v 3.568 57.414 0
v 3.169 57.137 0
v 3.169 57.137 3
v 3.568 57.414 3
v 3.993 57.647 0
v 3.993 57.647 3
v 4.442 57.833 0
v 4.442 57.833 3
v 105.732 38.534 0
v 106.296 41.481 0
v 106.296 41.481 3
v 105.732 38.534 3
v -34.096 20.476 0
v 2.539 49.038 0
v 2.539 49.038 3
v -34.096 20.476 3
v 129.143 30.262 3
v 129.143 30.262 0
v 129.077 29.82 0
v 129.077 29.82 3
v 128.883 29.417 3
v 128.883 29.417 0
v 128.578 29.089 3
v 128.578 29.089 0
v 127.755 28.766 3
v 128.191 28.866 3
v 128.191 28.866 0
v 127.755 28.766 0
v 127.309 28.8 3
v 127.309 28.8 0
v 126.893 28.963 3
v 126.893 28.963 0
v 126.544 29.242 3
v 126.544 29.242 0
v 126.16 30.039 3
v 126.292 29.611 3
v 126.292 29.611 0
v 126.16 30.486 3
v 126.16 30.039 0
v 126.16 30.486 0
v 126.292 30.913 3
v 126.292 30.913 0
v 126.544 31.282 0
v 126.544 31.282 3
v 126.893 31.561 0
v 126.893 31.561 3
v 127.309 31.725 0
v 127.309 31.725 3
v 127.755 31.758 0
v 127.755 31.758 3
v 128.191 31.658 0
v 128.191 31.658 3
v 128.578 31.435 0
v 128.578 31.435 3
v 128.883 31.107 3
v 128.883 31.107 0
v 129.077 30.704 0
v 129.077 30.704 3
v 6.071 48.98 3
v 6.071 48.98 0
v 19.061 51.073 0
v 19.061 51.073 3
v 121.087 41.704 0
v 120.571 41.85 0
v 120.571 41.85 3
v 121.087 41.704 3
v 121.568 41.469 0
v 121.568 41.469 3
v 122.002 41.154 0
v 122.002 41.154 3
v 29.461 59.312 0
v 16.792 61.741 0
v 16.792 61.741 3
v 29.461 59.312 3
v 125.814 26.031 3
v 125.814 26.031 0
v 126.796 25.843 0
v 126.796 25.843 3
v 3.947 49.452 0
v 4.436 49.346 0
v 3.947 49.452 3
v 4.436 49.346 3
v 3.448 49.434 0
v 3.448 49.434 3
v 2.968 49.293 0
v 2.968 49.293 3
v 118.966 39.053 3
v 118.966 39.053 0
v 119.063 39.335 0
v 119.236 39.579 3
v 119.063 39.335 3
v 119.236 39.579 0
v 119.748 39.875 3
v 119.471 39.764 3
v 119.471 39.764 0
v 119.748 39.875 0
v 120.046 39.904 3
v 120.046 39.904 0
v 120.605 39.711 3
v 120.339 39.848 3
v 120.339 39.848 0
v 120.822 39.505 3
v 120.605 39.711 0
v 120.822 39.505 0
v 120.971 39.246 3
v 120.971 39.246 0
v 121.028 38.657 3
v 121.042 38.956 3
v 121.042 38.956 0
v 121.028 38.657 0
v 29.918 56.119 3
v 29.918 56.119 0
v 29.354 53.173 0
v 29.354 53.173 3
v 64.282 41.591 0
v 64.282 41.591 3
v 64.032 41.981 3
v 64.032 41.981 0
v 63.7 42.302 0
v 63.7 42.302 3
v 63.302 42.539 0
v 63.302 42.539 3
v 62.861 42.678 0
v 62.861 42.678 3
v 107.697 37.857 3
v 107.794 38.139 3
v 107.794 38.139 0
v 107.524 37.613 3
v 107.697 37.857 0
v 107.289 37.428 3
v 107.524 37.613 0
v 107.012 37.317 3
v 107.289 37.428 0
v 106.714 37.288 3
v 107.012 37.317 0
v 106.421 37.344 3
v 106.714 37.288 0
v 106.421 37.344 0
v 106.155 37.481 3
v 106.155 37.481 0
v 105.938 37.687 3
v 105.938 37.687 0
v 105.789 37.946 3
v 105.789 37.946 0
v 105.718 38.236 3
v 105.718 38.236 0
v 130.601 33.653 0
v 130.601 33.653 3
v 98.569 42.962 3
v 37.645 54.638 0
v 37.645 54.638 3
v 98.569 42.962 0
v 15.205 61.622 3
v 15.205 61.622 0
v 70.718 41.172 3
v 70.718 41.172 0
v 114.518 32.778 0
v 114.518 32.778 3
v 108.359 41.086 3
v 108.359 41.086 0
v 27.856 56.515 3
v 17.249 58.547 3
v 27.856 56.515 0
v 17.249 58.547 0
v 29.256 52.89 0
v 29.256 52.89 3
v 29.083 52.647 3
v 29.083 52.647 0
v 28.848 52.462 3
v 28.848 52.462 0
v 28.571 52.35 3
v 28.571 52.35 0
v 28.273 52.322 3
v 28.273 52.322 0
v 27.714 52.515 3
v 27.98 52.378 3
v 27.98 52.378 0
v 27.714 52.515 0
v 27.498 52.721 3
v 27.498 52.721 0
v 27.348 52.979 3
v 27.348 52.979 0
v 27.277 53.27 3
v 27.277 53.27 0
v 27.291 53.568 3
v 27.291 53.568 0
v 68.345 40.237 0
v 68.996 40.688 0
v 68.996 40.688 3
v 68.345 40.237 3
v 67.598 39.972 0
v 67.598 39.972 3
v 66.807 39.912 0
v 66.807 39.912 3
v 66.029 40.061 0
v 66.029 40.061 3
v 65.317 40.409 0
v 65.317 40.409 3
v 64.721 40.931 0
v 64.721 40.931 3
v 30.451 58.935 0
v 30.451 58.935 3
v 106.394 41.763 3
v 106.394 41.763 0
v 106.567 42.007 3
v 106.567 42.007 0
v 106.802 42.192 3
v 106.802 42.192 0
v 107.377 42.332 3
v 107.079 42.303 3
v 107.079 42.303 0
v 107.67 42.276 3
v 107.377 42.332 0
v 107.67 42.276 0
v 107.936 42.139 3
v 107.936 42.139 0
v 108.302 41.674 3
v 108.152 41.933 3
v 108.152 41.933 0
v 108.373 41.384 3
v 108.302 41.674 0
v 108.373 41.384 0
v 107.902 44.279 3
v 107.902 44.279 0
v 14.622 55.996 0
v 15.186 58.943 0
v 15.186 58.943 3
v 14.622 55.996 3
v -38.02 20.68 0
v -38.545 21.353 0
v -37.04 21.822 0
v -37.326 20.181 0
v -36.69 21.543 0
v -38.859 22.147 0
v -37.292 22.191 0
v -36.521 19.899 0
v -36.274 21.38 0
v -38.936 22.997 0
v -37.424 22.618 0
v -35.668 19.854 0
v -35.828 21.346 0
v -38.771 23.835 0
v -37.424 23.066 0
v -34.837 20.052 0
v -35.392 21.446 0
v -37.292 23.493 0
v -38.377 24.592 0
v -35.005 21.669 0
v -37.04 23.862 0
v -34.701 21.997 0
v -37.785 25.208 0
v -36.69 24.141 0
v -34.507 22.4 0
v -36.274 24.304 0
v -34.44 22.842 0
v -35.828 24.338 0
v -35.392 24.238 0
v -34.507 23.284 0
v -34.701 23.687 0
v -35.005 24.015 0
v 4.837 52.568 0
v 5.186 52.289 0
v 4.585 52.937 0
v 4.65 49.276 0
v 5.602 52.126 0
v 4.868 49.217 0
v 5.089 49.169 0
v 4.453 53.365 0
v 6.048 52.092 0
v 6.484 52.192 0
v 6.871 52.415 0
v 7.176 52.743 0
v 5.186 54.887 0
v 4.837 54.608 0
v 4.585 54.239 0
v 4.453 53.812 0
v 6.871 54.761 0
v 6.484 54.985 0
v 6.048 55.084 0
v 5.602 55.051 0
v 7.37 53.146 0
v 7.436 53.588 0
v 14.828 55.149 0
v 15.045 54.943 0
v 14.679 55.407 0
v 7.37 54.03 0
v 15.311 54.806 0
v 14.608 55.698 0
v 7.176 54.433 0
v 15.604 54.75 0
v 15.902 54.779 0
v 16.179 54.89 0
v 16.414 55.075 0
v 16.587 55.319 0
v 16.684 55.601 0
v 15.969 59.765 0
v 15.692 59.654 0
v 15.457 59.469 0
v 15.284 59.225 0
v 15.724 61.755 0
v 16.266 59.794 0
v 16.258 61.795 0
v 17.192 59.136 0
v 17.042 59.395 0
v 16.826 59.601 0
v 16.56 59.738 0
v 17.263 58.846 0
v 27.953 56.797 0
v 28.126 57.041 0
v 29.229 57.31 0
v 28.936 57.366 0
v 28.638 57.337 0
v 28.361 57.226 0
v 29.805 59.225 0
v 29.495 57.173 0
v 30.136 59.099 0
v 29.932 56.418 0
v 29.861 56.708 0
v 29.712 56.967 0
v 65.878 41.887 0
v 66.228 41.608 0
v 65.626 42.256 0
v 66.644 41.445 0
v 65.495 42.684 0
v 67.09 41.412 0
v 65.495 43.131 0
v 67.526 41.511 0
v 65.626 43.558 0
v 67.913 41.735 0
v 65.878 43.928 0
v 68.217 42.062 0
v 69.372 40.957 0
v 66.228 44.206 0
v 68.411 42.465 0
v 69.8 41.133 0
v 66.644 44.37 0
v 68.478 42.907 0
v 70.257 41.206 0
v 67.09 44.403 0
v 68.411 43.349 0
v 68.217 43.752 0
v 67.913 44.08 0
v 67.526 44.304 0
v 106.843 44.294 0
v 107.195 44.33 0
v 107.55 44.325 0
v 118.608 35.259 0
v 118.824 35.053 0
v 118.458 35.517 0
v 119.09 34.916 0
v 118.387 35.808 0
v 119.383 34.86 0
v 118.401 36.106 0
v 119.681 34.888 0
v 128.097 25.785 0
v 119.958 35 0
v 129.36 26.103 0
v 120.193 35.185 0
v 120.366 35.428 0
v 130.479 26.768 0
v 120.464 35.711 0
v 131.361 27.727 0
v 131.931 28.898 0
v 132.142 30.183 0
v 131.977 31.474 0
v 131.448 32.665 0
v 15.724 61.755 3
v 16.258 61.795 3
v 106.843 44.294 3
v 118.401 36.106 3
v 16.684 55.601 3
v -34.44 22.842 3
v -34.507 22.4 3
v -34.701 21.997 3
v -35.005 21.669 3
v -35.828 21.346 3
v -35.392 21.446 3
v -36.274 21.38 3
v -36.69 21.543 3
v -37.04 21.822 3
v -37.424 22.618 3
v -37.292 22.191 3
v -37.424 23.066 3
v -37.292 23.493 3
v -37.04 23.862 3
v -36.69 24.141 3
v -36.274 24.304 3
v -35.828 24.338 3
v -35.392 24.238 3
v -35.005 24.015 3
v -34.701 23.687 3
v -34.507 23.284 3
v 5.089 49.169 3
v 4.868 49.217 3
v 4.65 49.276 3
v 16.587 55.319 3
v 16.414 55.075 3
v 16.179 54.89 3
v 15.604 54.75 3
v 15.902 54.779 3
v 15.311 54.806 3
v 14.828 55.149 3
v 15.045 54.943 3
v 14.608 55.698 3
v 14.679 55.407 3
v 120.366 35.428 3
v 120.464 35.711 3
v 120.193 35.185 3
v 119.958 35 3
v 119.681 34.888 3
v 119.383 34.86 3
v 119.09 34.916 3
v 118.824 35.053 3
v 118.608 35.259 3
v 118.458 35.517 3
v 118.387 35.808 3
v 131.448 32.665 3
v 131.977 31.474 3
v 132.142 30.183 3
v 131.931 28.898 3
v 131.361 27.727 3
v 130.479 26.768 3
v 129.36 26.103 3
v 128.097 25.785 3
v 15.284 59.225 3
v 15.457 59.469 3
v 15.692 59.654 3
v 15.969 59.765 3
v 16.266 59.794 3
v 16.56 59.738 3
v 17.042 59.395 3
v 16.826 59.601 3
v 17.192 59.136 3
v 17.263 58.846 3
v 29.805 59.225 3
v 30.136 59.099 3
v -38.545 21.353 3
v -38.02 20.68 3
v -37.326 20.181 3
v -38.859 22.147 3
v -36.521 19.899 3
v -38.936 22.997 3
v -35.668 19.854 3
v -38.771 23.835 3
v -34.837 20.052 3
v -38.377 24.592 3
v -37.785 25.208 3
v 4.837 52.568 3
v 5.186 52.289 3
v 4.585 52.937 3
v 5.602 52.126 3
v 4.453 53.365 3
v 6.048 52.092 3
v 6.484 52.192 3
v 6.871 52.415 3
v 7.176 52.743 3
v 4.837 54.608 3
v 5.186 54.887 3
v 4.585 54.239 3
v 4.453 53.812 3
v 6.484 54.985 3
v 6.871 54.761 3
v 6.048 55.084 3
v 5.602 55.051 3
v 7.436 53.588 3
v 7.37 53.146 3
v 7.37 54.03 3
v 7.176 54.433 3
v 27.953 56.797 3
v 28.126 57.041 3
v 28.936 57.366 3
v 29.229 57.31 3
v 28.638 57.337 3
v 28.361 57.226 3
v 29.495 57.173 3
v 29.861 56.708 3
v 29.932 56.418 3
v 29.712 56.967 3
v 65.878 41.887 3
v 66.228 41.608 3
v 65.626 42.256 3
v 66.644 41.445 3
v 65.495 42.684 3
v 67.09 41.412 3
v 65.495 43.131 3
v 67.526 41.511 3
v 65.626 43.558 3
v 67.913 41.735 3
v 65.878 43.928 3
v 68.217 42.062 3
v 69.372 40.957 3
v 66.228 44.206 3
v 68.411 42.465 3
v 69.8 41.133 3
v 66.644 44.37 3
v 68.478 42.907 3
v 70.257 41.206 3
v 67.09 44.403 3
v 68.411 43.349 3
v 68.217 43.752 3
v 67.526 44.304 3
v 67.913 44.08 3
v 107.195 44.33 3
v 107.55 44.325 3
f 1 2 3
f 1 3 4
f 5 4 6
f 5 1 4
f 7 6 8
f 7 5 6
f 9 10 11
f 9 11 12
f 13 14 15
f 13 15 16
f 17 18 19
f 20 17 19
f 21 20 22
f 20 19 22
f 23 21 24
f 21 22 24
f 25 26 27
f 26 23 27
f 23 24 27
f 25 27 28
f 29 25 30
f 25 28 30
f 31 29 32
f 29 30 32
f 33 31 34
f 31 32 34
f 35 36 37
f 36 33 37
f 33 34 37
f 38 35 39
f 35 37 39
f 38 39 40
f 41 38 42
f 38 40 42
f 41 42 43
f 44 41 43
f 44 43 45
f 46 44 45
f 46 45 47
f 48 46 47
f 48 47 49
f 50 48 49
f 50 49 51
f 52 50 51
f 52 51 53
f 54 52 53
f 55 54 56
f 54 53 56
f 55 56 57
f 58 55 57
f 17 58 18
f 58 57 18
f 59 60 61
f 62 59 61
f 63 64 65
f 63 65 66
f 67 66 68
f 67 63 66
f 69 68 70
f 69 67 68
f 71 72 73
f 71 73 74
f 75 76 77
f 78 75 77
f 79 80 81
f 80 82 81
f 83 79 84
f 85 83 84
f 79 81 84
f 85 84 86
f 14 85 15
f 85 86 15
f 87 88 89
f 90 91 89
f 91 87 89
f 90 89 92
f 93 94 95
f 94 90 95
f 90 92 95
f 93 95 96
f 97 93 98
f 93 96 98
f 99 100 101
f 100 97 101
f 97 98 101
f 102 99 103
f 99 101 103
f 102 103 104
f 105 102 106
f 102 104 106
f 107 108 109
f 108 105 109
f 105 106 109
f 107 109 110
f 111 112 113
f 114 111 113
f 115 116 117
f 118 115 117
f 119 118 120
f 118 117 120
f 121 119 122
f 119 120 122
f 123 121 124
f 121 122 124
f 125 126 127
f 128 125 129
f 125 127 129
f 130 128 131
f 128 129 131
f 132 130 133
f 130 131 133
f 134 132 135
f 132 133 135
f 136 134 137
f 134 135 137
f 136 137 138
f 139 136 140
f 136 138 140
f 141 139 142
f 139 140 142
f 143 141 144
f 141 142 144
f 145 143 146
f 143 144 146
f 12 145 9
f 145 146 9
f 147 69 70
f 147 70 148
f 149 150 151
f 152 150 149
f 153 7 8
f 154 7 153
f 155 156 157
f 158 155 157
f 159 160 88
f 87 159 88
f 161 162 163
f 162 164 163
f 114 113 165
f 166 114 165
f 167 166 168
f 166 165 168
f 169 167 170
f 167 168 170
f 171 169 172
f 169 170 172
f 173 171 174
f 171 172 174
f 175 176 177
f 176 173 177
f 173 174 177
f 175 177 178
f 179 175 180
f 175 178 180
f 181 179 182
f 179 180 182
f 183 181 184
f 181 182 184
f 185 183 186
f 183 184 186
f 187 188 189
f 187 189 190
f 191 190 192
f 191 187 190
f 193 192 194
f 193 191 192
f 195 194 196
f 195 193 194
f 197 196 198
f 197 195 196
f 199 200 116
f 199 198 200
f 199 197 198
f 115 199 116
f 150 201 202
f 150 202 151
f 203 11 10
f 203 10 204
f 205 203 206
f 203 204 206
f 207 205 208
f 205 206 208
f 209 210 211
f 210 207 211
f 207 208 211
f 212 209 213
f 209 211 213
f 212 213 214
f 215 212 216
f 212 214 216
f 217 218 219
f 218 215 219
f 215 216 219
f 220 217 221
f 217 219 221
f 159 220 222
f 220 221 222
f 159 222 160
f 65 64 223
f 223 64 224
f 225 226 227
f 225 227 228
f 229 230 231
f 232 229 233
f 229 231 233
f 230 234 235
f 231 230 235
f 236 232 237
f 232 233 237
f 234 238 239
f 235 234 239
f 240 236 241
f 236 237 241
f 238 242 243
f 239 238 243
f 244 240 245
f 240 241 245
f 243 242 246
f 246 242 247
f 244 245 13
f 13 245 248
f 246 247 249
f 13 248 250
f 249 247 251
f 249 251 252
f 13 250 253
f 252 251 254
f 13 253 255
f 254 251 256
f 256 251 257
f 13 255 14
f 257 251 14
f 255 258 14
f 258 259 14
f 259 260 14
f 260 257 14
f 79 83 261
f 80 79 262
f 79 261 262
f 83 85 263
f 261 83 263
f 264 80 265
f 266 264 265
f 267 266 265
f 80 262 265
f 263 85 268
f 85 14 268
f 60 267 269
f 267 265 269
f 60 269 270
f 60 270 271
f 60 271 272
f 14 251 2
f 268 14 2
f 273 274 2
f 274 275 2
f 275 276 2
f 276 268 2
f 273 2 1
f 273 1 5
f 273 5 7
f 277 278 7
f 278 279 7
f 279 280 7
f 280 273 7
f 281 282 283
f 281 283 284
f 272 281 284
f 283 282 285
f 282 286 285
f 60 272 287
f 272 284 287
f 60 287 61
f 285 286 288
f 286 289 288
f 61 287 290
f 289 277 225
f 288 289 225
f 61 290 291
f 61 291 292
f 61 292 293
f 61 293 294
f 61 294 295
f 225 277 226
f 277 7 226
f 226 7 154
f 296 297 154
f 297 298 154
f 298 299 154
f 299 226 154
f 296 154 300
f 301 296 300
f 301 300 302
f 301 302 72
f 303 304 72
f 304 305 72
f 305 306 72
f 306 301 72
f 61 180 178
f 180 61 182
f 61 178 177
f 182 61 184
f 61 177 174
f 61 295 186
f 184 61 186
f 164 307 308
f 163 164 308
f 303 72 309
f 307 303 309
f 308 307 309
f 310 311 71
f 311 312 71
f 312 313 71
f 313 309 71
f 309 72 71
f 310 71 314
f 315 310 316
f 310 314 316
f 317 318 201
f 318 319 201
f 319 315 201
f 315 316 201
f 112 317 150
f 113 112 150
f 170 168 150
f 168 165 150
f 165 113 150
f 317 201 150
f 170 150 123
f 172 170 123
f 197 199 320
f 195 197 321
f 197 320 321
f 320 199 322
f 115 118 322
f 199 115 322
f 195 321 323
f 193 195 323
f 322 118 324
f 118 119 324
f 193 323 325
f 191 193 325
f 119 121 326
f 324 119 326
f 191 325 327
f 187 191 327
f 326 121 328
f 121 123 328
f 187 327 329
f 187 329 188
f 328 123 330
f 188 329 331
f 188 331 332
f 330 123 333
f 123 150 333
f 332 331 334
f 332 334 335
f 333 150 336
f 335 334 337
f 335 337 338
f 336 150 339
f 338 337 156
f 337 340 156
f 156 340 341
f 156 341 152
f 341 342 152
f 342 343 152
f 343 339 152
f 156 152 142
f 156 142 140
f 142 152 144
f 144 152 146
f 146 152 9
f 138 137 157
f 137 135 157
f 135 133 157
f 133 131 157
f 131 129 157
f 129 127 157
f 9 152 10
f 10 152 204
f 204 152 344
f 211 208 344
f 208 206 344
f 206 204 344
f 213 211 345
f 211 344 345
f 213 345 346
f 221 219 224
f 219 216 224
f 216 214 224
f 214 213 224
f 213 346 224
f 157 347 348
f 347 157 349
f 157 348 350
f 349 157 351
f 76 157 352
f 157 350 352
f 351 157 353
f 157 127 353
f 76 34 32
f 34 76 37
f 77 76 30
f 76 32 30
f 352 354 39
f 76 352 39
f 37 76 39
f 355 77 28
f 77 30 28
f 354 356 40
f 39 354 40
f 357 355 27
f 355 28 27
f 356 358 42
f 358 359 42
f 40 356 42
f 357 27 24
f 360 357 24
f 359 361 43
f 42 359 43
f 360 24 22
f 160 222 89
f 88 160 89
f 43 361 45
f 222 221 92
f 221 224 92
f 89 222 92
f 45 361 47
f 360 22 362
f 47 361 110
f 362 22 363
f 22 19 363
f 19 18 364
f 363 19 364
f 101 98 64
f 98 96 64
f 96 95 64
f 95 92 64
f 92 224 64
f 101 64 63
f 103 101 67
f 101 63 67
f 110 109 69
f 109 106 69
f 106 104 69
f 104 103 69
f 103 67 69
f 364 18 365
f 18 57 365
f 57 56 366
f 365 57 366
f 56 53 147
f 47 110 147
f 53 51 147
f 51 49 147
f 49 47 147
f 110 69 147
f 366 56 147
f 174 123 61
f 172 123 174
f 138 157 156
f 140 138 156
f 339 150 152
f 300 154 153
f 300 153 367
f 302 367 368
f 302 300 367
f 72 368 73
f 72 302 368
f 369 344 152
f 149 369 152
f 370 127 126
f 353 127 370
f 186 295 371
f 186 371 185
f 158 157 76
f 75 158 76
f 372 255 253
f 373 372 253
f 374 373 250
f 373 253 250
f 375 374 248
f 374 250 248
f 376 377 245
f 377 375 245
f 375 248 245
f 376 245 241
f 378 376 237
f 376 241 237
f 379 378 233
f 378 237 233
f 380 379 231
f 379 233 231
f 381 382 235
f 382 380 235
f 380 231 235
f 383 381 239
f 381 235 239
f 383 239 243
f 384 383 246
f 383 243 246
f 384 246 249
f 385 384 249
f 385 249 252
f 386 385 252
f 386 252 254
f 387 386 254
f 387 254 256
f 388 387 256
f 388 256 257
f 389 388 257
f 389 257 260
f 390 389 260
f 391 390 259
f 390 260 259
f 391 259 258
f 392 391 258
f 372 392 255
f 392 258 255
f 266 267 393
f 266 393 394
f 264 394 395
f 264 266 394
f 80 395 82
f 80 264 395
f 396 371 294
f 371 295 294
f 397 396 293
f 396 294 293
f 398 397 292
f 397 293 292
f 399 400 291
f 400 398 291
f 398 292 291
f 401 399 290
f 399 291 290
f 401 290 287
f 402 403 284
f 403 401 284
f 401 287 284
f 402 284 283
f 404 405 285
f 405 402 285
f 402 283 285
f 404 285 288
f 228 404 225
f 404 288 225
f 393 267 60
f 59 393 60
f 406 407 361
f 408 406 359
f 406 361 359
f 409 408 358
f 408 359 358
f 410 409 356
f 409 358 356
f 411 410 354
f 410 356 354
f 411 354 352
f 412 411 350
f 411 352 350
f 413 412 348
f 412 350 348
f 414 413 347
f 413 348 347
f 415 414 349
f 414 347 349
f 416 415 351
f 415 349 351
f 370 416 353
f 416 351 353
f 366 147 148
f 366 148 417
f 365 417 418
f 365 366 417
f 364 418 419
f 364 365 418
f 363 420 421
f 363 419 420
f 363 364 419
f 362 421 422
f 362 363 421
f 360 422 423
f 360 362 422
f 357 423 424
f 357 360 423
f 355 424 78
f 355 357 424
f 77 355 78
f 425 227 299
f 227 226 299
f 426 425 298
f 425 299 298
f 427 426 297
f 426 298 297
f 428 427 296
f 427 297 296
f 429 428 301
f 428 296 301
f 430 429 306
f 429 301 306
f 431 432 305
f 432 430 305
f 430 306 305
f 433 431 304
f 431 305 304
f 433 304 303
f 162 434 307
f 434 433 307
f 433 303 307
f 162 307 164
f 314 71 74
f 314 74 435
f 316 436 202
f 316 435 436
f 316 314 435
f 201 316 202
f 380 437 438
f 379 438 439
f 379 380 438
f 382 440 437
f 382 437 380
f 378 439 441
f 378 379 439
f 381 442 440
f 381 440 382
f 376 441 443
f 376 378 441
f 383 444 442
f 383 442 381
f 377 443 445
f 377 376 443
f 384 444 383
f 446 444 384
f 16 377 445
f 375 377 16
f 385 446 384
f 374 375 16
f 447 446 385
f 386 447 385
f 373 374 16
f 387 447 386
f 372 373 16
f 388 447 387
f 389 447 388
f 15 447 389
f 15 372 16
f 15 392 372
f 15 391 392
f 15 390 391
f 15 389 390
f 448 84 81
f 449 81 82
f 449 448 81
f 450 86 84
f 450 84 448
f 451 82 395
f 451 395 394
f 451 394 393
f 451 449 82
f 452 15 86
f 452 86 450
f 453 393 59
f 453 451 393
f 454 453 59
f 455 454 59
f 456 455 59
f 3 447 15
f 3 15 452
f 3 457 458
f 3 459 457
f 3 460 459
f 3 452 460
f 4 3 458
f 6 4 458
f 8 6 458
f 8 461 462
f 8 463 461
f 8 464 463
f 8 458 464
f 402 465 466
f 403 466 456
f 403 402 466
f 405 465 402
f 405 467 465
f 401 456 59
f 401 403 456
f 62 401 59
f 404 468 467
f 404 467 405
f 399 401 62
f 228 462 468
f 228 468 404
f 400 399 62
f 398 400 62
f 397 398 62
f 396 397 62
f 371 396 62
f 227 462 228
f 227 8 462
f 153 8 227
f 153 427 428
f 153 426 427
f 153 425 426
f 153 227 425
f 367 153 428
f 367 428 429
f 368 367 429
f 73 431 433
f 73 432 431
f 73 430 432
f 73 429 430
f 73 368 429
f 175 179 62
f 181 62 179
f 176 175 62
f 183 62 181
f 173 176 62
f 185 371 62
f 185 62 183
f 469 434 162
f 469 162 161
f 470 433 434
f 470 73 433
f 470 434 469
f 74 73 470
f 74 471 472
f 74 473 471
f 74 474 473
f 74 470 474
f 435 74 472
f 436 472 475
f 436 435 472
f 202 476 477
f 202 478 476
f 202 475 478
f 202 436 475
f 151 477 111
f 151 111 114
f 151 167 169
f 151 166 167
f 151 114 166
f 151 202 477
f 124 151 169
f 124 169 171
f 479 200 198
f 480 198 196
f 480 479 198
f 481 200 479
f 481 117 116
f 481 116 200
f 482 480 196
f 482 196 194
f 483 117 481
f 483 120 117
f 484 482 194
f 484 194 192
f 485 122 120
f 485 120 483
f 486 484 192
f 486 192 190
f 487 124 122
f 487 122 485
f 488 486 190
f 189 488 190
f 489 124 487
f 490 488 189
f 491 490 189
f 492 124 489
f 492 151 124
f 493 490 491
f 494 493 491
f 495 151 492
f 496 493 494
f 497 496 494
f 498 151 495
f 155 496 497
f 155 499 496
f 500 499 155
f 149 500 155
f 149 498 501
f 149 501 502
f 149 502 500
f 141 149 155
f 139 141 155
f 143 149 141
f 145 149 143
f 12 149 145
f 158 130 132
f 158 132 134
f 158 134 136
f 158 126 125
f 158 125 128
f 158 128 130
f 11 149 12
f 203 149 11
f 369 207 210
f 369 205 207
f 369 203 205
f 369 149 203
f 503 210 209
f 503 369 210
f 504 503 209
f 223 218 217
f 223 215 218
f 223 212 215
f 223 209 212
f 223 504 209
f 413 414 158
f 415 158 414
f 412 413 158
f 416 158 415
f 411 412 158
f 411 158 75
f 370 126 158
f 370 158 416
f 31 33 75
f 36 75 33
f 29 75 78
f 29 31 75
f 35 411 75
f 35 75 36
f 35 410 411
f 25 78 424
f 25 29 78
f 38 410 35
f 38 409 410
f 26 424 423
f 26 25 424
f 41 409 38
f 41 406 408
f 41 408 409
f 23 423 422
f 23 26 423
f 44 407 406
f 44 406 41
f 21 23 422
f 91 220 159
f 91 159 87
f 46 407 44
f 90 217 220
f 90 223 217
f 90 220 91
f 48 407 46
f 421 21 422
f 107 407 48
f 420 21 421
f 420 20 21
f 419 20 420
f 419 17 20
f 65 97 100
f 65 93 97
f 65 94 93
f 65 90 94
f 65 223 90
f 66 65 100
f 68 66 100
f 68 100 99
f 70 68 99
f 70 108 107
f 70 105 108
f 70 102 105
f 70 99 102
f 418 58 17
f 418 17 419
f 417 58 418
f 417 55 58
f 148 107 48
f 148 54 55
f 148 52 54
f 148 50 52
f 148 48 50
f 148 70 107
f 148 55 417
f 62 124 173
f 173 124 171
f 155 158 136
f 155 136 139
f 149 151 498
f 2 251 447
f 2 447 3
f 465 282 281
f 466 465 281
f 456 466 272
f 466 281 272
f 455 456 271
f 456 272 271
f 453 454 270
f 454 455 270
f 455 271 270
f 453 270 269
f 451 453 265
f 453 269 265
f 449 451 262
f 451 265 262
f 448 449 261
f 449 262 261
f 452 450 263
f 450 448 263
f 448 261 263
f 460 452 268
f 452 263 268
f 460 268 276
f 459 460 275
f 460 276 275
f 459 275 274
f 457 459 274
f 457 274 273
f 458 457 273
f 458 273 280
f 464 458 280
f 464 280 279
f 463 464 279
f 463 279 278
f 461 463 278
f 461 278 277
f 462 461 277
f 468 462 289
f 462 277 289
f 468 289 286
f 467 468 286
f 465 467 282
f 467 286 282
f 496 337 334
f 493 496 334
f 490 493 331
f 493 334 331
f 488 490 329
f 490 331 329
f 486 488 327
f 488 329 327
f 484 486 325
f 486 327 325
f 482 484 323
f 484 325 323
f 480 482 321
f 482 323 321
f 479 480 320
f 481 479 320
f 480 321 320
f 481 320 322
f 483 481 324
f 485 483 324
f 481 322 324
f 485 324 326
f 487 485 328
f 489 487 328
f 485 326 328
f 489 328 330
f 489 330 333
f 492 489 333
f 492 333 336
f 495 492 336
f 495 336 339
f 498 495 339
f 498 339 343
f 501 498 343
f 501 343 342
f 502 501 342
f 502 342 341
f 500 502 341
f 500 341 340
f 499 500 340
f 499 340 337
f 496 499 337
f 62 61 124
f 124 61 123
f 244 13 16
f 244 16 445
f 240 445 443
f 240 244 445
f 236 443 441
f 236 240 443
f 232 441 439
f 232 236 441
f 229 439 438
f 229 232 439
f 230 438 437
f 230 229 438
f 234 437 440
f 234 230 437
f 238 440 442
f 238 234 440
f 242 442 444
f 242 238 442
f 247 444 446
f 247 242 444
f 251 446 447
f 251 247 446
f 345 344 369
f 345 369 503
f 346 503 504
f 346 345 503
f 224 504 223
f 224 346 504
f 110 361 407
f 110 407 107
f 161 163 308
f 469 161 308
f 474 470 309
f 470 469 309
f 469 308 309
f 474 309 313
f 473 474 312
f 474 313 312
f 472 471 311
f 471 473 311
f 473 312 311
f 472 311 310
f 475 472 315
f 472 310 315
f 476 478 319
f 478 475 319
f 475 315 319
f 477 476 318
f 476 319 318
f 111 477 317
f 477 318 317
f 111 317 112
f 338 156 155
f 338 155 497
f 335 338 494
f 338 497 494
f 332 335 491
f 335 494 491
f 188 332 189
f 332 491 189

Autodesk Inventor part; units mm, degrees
ref_plane "YZ Plane" through (0, 0, 0) normal (1, 0, 0) x (0, 1, 0)
ref_plane "XZ Plane" through (0, 0, 0) normal (0, 1, 0) x (-1, 0, 0)
ref_plane "XY Plane" through (0, 0, 0) normal (0, 0, 1) x (1, 0, 0)
sketch "スケッチ1" plane through (0, 0, 0) normal (0, 0, 1) x (1, 0, 0)
  circle A0 centre (127.64315, 30.26217) radius 1.5
  circle A1 centre (5.936242, 53.5882) radius 1.5
  line L0 (5.936242, 53.5882) -> (127.64315, 30.26217) construction
  circle A2 centre (5.936242, 53.5882) radius 4.025
  circle A3 centre (127.64315, 30.26217) radius 4.025
  arc A4 (127.25169, 23.248085) -> (128.965476, 37.161596) centre (127.64315, 30.26217) ccw
  line L1 (12.835668, 52.265874) -> (13.400362, 55.212248)
  line L2 (15.462824, 54.816962) -> (26.069771, 52.784062)
  line L3 (28.132233, 52.388776) -> (27.567538, 49.442402)
  line L4 (14.89813, 51.870588) -> (25.505076, 49.837688)
  line L5 (120.743724, 31.584496) -> (121.308418, 34.53087)
  line L6 (119.245956, 34.926156) -> (108.63901, 36.959056)
  line L7 (106.576548, 37.354342) -> (106.011853, 34.407968)
  line L8 (108.074315, 34.012682) -> (118.681262, 31.979782)
  circle A5 centre (19.354562, 46.434577) radius 3
  circle A6 centre (112.530747, 28.576671) radius 3
  line L9 (7.258568, 60.487626) -> (128.965476, 37.161596)
  arc A7 (17.926333, 42.16724) -> (21.546529, 42.504529) centre (19.354562, 46.434577) ccw
  arc A8 (109.041036, 25.735559) -> (112.27999, 24.083663) centre (112.530747, 28.576671) ccw
  line L10 (3.706619, 46.926413) -> (17.926333, 42.16724)
  line L11 (112.27999, 24.083663) -> (127.25169, 23.248085)
  circle A9 centre (19.354562, 46.434577) radius 1.5
  circle A10 centre (112.530747, 28.576671) radius 1.5
  line L12 (32.344248, 48.52691) -> (21.546529, 42.504529)
  line L13 (109.041036, 25.735559) -> (101.235144, 35.32346)
  line L14 (32.344248, 48.52691) -> (101.235144, 35.32346)
  arc A11 (108.63901, 36.959056) -> (106.576548, 37.354342) centre (107.607779, 37.156699) ccw
  arc A12 (106.011853, 34.407968) -> (108.074315, 34.012682) centre (107.043084, 34.210325) ccw
  arc A13 (121.308418, 34.53087) -> (119.245956, 34.926156) centre (120.277187, 34.728513) ccw
  arc A14 (118.681262, 31.979782) -> (120.743724, 31.584496) centre (119.712493, 31.782139) ccw
  arc A15 (28.132233, 52.388776) -> (26.069771, 52.784062) centre (27.101002, 52.586419) ccw
  arc A16 (25.505076, 49.837688) -> (27.567538, 49.442402) centre (26.536307, 49.640045) ccw
  arc A17 (15.462824, 54.816962) -> (13.400362, 55.212248) centre (14.431593, 55.014605) ccw
  arc A18 (12.835668, 52.265874) -> (14.89813, 51.870588) centre (13.866899, 52.068231) ccw
  line L15 (5.936242, 53.5882) -> (-35.940425, 22.842004) construction
  circle A19 centre (-35.940425, 22.842004) radius 1.5
  arc A20 (-37.715892, 25.26021) -> (-34.164958, 20.423799) centre (-35.940425, 22.842004) ccw
  line L16 (-37.715892, 25.26021) -> (-0.959545, 52.247024)
  line L17 (-34.164958, 20.423799) -> (2.591389, 47.410613)
  arc A21 (7.258568, 60.487626) -> (-0.959545, 52.247024) centre (5.936242, 53.5882) ccw
  arc A22 (2.591389, 47.410613) -> (3.706619, 46.926413) centre (5.936242, 53.5882) ccw
  point P0 (0, 0)
  point P1 (0, 0)
  dimension "d0" = 8.05
  dimension "d1" = 8.05
  dimension "d2" = 3
  dimension "d3" = 3
  dimension "d4" = 15
  dimension "d5" = 3
  dimension "d6" = 15
  dimension "d7" = 6
  dimension "d8" = 6
  dimension "d9" = 9
  dimension "d10" = 9
  dimension "d11" = 3
  dimension "d12" = 3
  dimension "d13" = 7.5
  dimension "d14" = 7.5
  dimension "d15" = 40
  dimension "d16" = 40
  dimension "d17" = 2.1
  dimension "d18" = 2.1
  dimension "d19" = 2.1
  dimension "d20" = 2.1
  dimension "d21" = 2.1
  dimension "d22" = 2.1
  dimension "d23" = 2.1
  dimension "d24" = 2.1
  dimension "d25" = 3
  dimension "d26" = 6
  dimension "d27" = 3
  dimension "d28" = 3
sketch "スケッチ3" plane through (0, 0, 0) normal (0, 0, 1) x (1, 0, 0)
  circle A0 centre (0, 0) radius 10.1 construction
  circle A1 centre (25.320198, -9.936175) radius 17.1 construction
  circle A2 centre (110.474331, -16.4118) radius 28.1 construction
  circle A3 centre (62.413099, -12.756939) radius 20.1 construction
  circle A4 centre (-21.690847, -16.4118) radius 17.1 construction
  circle A5 centre (-105.525669, -16.4118) radius 28.1 construction
  line L0 (-170.91498, -81.4118) -> (490.004419, -81.4118)
  line L1 (-105.525669, -16.4118) -> (-21.690847, -16.4118) construction
  line L2 (110.474331, -16.4118) -> (25.320198, -9.936175) construction
  line L3 (110.474331, -16.4118) -> (104.150058, -0.631953)
  line L4 (104.150058, -0.631953) -> (95.593688, 20.717252) construction
  line L5 (95.593688, 20.717252) -> (70.474331, -10.4118) construction
  line L6 (70.474331, -10.4118) -> (110.474331, -16.4118) construction
  line L7 (-137.681852, 53.5882) -> (165.818568, 53.5882)
  line L8 (25.320198, -9.936175) -> (108.686903, 8.5882) construction
  line L9 (25.320198, -9.936175) -> (102.538646, -46.4118) construction
  line L10 (25.320198, -9.936175) -> (5.936242, 53.5882) construction
  line L11 (5.936242, 53.5882) -> (127.64315, 30.26217)
  line L12 (127.64315, 30.26217) -> (110.474331, -16.4118) construction
  line L13 (102.538646, -46.4118) -> (118.068109, 0.832921) construction
  line L14 (118.068109, 0.832921) -> (5.936242, 53.5882) construction
  line L15 (108.686903, 8.5882) -> (129.858294, 53.5882) construction
  line L16 (129.858294, 53.5882) -> (5.936242, 53.5882) construction
  line L17 (119.272599, 31.0882) -> (366.444098, 68.5882) construction
  line L18 (119.05874, 6.925185) -> (362.021337, 65.824902) construction
  line L19 (110.303378, -22.78944) -> (351.062397, 44.553669) construction
  line L20 (127.64315, 30.26217) -> (4.192658, 19.461651) construction
  circle A6 centre (80.474331, 23.123973) radius 3 construction
  circle A7 centre (80.474331, 23.123973) radius 1.5
  arc A8 (79.800999, 27.573313) -> (76.161969, 24.409872) centre (80.474331, 23.123973) ccw
  circle A9 centre (70.474331, -10.4118) radius 1.5
  arc A10 (66.161969, -9.125901) -> (69.424217, -14.787558) centre (70.474331, -10.4118) ccw
  circle A11 centre (150.474331, 0.5882) radius 1.5
  arc A12 (152.562257, -3.398097) -> (154.040845, 3.33228) centre (150.474331, 0.5882) ccw
  circle A13 centre (127.64315, 30.26217) radius 1.5
  arc A14 (131.281576, 32.91016) -> (126.969818, 34.71151) centre (127.64315, 30.26217) ccw
  circle A15 centre (110.474331, -16.4118) radius 5
  arc A16 (108.607462, -24.190926) -> (114.186199, -23.49855) centre (110.474331, -16.4118) ccw
  line L21 (76.161969, 24.409872) -> (66.161969, -9.125901)
  line L22 (69.424217, -14.787558) -> (108.607462, -24.190926)
  line L23 (114.186199, -23.49855) -> (152.562257, -3.398097)
  line L24 (154.040845, 3.33228) -> (131.209664, 33.00625)
  line L25 (126.969818, 34.71151) -> (79.800999, 27.573313)
  circle A17 centre (-145.525669, 0.5882) radius 1.5
  arc A18 (-149.092184, 3.33228) -> (-147.613596, -3.398097) centre (-145.525669, 0.5882) ccw
  circle A19 centre (-105.525669, -16.4118) radius 5
  arc A20 (-109.237538, -23.49855) -> (-103.6588, -24.190926) centre (-105.525669, -16.4118) ccw
  circle A21 centre (-65.525669, -10.4118) radius 1.5
  arc A22 (-64.475556, -14.787558) -> (-61.213308, -9.125901) centre (-65.525669, -10.4118) ccw
  circle A23 centre (0, 0) radius 20.05 construction
  circle A24 centre (110.474331, -16.4118) radius 30.1 construction
  circle A25 centre (62.413099, -12.756939) radius 22.1 construction
  circle A26 centre (25.320198, -9.936175) radius 19.1 construction
  circle A27 centre (0, 0) radius 12.1 construction
  circle A28 centre (-21.690847, -16.4118) radius 19.1 construction
  circle A29 centre (-105.525669, -16.4118) radius 30.1 construction
  circle A30 centre (0, 0) radius 20.55 construction
  circle A31 centre (95.593688, 20.717252) radius 4.025 construction
  circle A32 centre (95.593688, 20.717252) radius 6.025 construction
  circle A33 centre (-75.525669, 23.123973) radius 1.5
  arc A34 (-71.213308, 24.409872) -> (-74.852338, 27.573313) centre (-75.525669, 23.123973) ccw
  circle A35 centre (-122.694488, 30.26217) radius 1.5
  arc A36 (-122.021157, 34.71151) -> (-126.261003, 33.00625) centre (-122.694488, 30.26217) ccw
  line L26 (-126.261003, 33.00625) -> (-149.092184, 3.33228)
  line L27 (-147.613596, -3.398097) -> (-109.237538, -23.49855)
  line L28 (-103.6588, -24.190926) -> (-64.475556, -14.787558)
  line L29 (-61.213308, -9.125901) -> (-71.213308, 24.409872)
  line L30 (-74.852338, 27.573313) -> (-122.021157, 34.71151)
  circle A37 centre (14, -17.4118) radius 2.29213 construction
  circle A38 centre (-14, -17.4118) radius 2.29213 construction
  circle A39 centre (-14, -17.4118) radius 14 construction
  circle A40 centre (14, -17.4118) radius 14 construction
  line L31 (-170.651239, -31.4118) -> (202.86558, -31.4118)
  line L32 (5.936242, 53.5882) -> (-42.252867, 34.177029) construction
  line L33 (5.936242, 53.5882) -> (-29.404465, 15.509095) construction
  circle A41 centre (5.936242, 53.5882) radius 1.5
  arc A42 (9.961109, 55.600773) -> (4.254869, 57.762285) centre (5.936242, 53.5882) ccw
  line L34 (-21.690847, -16.4118) -> (-99.974162, 13.5882) construction
  line L35 (-21.690847, -16.4118) -> (-101.711328, -41.4118) construction
  line L36 (9.961109, 55.600773) -> (31.415648, 12.694659)
  circle A43 centre (-50.601037, 30.814282) radius 1.5
  arc A44 (-52.28241, 34.988367) -> (-54.424801, 28.441767) centre (-50.601037, 30.814282) ccw
  line L37 (4.254869, 57.762285) -> (-52.28241, 34.988367)
  line L38 (-54.424801, 28.441767) -> (-46.715132, 16.016156)
  circle A45 centre (27.390781, 10.682087) radius 3 construction
  circle A46 centre (-84.86606, 5.271327) radius 4.5 construction
  circle A47 centre (-132.017427, -1.981251) radius 4.5 construction
  line L39 (-132.701548, 2.466443) -> (-85.550181, 9.71902) construction
  arc A48 (26.900287, 6.208898) -> (31.415648, 12.694659) centre (27.390781, 10.682087) ccw
  arc A49 (-46.715132, 16.016156) -> (-43.381863, 13.915483) centre (-42.891368, 18.388671) ccw
  line L40 (-43.381863, 13.915483) -> (26.900287, 6.208898)
  circle A50 centre (-42.252867, 34.177029) radius 3 construction
  circle A51 centre (25.320198, -9.936175) radius 4.025 construction
  circle A52 centre (-21.690847, -16.4118) radius 4.025 construction
  circle A53 centre (-42.891368, 18.388671) radius 1.5
  circle A54 centre (27.390781, 10.682087) radius 1.5
  circle A55 centre (-57.813011, 39.770535) radius 4.5 construction
  circle A56 centre (-99.303951, 63.315241) radius 4.5 construction
  line L41 (5.936242, 53.5882) -> (-35.940425, 22.842004) construction
  circle A57 centre (-58.005574, -24.479052) radius 20.1 construction
  circle A58 centre (-58.005574, -24.479052) radius 22.1 construction
  line L42 (-53.326057, 39.428119) -> (-56.279689, 0.724331) construction
  circle A59 centre (-42.252867, 34.177029) radius 4.5
  dimension "d125" = 9
  dimension "d126" = 9
  dimension "d141" = 9
  dimension "d166" = 8.07688
  dimension "d167" = 8.07688
  dimension "d170" = 61.9691
  dimension "d171" = 61.9691
  dimension "d37" = 20.2
  dimension "d38" = 34.2
  dimension "d39" = 56.2
  dimension "d40" = 40.2
  dimension "d41" = 216
  dimension "d42" = 65
  dimension "d43" = 65
  dimension "d44" = 34.2
  dimension "d45" = 56.2
  dimension "d46" = 17
  dimension "d47" = 23
  dimension "d48" = 40
  dimension "d49" = 40
  dimension "d50" = 6
  dimension "d51" = 135
  dimension "d52" = 25
  dimension "d53" = 30
  dimension "d54" = 5
  dimension "d55" = 2
  dimension "d56" = 250
  dimension "d57" = 150
  dimension "d58" = 250
  dimension "d59" = 250
  dimension "d60" = 123.823
  dimension "d61" = 123.823
  dimension "d62" = 123.823
  dimension "d63" = 6
  dimension "d64" = 3
  dimension "d65" = 9
  dimension "d66" = 3
  dimension "d67" = 9
  dimension "d68" = 3
  dimension "d69" = 9
  dimension "d70" = 40
  dimension "d71" = 17
  dimension "d72" = 3
  dimension "d73" = 9
  dimension "d74" = 10
  dimension "d75" = 3
  dimension "d76" = 3
  dimension "d77" = 9
  dimension "d78" = 40
  dimension "d79" = 17
  dimension "d80" = 10
  dimension "d81" = 3
  dimension "d82" = 3
  dimension "d83" = 9
  dimension "d84" = 40
  dimension "d85" = 6
  dimension "d86" = 40.1
  dimension "d87" = 2
  dimension "d88" = 2
  dimension "d89" = 2
  dimension "d90" = 2
  dimension "d91" = 2
  dimension "d92" = 2
  dimension "d93" = 0.5
  dimension "d94" = 8.05
  dimension "d95" = 2
  dimension "d96" = 3
  dimension "d97" = 9
  dimension "d98" = 3
  dimension "d99" = 9
  dimension "d100" = 46.67397
sketch "スケッチ2" plane through (0, 0, 0) normal (0, 0, 1) x (1, 0, 0)
  circle A0 centre (-35.940425, 22.842004) radius 1.5
  circle A1 centre (5.936242, 53.5882) radius 1.5
  circle A2 centre (127.64315, 30.26217) radius 1.5
  line L0 (19.061011, 51.072741) -> (114.518381, 32.777629)
  circle A3 centre (5.936242, 53.5882) radius 4.5
  circle A4 centre (127.64315, 30.26217) radius 4.5
  circle A5 centre (-35.940425, 22.842004) radius 3
  line L1 (5.0892, 49.168639) -> (6.071325, 48.980408)
  line L2 (6.071325, 48.980408) -> (19.061011, 51.072741)
  line L3 (114.518381, 32.777629) -> (125.813983, 26.03084)
  line L4 (125.813983, 26.03084) -> (126.796108, 25.842609)
  line L5 (4.441871, 57.832827) -> (15.204741, 61.622021)
  line L6 (-37.784972, 25.207939) -> (3.169421, 57.137102)
  line L7 (3.512579, 49.796649) -> (-34.095878, 20.47607)
  line L8 (122.00181, 41.153572) -> (130.601007, 33.653494)
  circle A6 centre (80.318062, 36.277771) radius 3
  circle A7 centre (80.318062, 36.277771) radius 4.5
  line L9 (128.210589, 34.72625) -> (80.885502, 40.741852)
  circle A8 centre (80.474331, 23.123973) radius 1.5
  line L10 (120.463576, 35.710991) -> (121.028271, 38.657365)
  line L11 (15.186361, 58.942751) -> (14.621667, 55.996377)
  circle A9 centre (66.977927, 42.90731) radius 1.5
  circle A10 centre (66.977927, 42.90731) radius 3
  line L12 (29.918232, 56.119279) -> (29.353537, 53.172905)
  arc A11 (17.248823, 58.547465) -> (15.186361, 58.942751) centre (16.217592, 58.745108) ccw
  arc A12 (29.918232, 56.119279) -> (27.85577, 56.514565) centre (28.887001, 56.316922) ccw
  arc A13 (27.291076, 53.568191) -> (29.353537, 53.172905) centre (28.322307, 53.370548) ccw
  arc A14 (14.621667, 55.996377) -> (16.684129, 55.601091) centre (15.652898, 55.798734) ccw
  line L13 (17.248823, 58.547465) -> (27.85577, 56.514565)
  line L14 (16.684129, 55.601091) -> (27.291076, 53.568191)
  arc A15 (31.882481, 55.742816) -> (27.00191, 58.714615) centre (28.887001, 56.316922) ccw
  line L15 (27.00191, 58.714615) -> (18.855609, 60.275914)
  arc A16 (18.855609, 60.275914) -> (15.204741, 61.622021) centre (16.217592, 58.745108) ccw
  line L16 (106.2964, 41.480837) -> (105.731706, 38.534463)
  arc A17 (108.358862, 41.085551) -> (106.2964, 41.480837) centre (107.327631, 41.283194) ccw
  arc A18 (121.028271, 38.657365) -> (118.965809, 39.052651) centre (119.99704, 38.855008) ccw
  arc A19 (118.401114, 36.106277) -> (120.463576, 35.710991) centre (119.432345, 35.908634) ccw
  arc A20 (105.731706, 38.534463) -> (107.794168, 38.139177) centre (106.762937, 38.33682) ccw
  line L17 (31.882481, 55.742816) -> (104.332151, 41.8573)
  line L18 (108.358862, 41.085551) -> (118.965809, 39.052651)
  line L19 (107.794168, 38.139177) -> (118.401114, 36.106277)
  arc A21 (122.00181, 41.153572) -> (118.111949, 41.252701) centre (119.99704, 38.855008) ccw
  line L20 (118.111949, 41.252701) -> (109.965648, 42.814)
  arc A22 (109.965648, 42.814) -> (104.332151, 41.8573) centre (107.327631, 41.283194) ccw
  line L21 (30.450999, 58.935397) -> (37.645199, 54.638348)
  line L22 (16.791698, 61.740588) -> (29.461109, 59.312402)
  line L23 (120.571146, 41.850488) -> (107.901737, 44.278674)
  line L24 (106.8426, 44.294381) -> (98.569433, 42.961768)
  point P0 (0, 0)
  dimension "d36" = 9
  dimension "d29" = 9
  dimension "d30" = 9
  dimension "d31" = 6
  dimension "d35" = 6
  dimension "d155" = 47.70588
  dimension "d156" = 47.70588
  dimension "d163" = 3
  dimension "d164" = 3
  dimension "d166" = 8.07688
  dimension "d167" = 8.07688
  dimension "d168" = 3
  dimension "d169" = 6
  dimension "d170" = 61.9691
  dimension "d171" = 61.9691
  dimension "d174" = 15
  dimension "d175" = 2.1
  dimension "d176" = 2
  dimension "d178" = 2
  dimension "d179" = 2
  dimension "d180" = 15
  dimension "d181" = 2.1
  dimension "d182" = 7
  dimension "d183" = 2
  dimension "d184" = 2
  dimension "d187" = 160
  dimension "d188" = 160
  dimension "d189" = 160
  dimension "d190" = 160
  dimension "d191" = 1
  dimension "d192" = 1
extrude "押し出し1" add sketch "スケッチ2" along normal blind 3 contours L2 L1 A3 L5 A16 L15 A15 L17 A22 L20 A21 L8 A4 L9 L10 A18 L18 A17 L16 A20 A7 L0 A10 | A10 L0 A9 | L0 A9 A10 | A9 L0 | A3 | A7 L0 | L7 A5 L6 A3 | L9 A20 A19 A4 L4 L3 L0 A7 | A5 | A20 L19 A19 L9 | L22 A15 L15 A16 | A4 | L21 L17 A15 | L24 A22 L17 | A21 L20 A22 L23 picked at (66.846156, 43.480469) picked at (82.873228, 39.071854)
extrude "押し出し2" cut sketch "スケッチ2" along normal blind 3 contours A9 L0 | L0 A9
fillet "フィレット1" radius 2 1 edges at (3.5126, 49.7966, 1.5)
fillet "フィレット2" radius 2 2 edges at (64.0118, 42.4576, 1.5) (69.5676, 41.3928, 1.5)
equation "\"d16\" = d15"
equation "\"d167\" = d166"
equation "\"d171\" = d170"
equation "\"d44\" = d38"
equation "\"d45\" = d39"
equation "\"d61\" = d60"
equation "\"d62\" = d60"
equation "\"d156\" = d155"
properties part number "台形サスバー２" material "アルミニウム 7075"
